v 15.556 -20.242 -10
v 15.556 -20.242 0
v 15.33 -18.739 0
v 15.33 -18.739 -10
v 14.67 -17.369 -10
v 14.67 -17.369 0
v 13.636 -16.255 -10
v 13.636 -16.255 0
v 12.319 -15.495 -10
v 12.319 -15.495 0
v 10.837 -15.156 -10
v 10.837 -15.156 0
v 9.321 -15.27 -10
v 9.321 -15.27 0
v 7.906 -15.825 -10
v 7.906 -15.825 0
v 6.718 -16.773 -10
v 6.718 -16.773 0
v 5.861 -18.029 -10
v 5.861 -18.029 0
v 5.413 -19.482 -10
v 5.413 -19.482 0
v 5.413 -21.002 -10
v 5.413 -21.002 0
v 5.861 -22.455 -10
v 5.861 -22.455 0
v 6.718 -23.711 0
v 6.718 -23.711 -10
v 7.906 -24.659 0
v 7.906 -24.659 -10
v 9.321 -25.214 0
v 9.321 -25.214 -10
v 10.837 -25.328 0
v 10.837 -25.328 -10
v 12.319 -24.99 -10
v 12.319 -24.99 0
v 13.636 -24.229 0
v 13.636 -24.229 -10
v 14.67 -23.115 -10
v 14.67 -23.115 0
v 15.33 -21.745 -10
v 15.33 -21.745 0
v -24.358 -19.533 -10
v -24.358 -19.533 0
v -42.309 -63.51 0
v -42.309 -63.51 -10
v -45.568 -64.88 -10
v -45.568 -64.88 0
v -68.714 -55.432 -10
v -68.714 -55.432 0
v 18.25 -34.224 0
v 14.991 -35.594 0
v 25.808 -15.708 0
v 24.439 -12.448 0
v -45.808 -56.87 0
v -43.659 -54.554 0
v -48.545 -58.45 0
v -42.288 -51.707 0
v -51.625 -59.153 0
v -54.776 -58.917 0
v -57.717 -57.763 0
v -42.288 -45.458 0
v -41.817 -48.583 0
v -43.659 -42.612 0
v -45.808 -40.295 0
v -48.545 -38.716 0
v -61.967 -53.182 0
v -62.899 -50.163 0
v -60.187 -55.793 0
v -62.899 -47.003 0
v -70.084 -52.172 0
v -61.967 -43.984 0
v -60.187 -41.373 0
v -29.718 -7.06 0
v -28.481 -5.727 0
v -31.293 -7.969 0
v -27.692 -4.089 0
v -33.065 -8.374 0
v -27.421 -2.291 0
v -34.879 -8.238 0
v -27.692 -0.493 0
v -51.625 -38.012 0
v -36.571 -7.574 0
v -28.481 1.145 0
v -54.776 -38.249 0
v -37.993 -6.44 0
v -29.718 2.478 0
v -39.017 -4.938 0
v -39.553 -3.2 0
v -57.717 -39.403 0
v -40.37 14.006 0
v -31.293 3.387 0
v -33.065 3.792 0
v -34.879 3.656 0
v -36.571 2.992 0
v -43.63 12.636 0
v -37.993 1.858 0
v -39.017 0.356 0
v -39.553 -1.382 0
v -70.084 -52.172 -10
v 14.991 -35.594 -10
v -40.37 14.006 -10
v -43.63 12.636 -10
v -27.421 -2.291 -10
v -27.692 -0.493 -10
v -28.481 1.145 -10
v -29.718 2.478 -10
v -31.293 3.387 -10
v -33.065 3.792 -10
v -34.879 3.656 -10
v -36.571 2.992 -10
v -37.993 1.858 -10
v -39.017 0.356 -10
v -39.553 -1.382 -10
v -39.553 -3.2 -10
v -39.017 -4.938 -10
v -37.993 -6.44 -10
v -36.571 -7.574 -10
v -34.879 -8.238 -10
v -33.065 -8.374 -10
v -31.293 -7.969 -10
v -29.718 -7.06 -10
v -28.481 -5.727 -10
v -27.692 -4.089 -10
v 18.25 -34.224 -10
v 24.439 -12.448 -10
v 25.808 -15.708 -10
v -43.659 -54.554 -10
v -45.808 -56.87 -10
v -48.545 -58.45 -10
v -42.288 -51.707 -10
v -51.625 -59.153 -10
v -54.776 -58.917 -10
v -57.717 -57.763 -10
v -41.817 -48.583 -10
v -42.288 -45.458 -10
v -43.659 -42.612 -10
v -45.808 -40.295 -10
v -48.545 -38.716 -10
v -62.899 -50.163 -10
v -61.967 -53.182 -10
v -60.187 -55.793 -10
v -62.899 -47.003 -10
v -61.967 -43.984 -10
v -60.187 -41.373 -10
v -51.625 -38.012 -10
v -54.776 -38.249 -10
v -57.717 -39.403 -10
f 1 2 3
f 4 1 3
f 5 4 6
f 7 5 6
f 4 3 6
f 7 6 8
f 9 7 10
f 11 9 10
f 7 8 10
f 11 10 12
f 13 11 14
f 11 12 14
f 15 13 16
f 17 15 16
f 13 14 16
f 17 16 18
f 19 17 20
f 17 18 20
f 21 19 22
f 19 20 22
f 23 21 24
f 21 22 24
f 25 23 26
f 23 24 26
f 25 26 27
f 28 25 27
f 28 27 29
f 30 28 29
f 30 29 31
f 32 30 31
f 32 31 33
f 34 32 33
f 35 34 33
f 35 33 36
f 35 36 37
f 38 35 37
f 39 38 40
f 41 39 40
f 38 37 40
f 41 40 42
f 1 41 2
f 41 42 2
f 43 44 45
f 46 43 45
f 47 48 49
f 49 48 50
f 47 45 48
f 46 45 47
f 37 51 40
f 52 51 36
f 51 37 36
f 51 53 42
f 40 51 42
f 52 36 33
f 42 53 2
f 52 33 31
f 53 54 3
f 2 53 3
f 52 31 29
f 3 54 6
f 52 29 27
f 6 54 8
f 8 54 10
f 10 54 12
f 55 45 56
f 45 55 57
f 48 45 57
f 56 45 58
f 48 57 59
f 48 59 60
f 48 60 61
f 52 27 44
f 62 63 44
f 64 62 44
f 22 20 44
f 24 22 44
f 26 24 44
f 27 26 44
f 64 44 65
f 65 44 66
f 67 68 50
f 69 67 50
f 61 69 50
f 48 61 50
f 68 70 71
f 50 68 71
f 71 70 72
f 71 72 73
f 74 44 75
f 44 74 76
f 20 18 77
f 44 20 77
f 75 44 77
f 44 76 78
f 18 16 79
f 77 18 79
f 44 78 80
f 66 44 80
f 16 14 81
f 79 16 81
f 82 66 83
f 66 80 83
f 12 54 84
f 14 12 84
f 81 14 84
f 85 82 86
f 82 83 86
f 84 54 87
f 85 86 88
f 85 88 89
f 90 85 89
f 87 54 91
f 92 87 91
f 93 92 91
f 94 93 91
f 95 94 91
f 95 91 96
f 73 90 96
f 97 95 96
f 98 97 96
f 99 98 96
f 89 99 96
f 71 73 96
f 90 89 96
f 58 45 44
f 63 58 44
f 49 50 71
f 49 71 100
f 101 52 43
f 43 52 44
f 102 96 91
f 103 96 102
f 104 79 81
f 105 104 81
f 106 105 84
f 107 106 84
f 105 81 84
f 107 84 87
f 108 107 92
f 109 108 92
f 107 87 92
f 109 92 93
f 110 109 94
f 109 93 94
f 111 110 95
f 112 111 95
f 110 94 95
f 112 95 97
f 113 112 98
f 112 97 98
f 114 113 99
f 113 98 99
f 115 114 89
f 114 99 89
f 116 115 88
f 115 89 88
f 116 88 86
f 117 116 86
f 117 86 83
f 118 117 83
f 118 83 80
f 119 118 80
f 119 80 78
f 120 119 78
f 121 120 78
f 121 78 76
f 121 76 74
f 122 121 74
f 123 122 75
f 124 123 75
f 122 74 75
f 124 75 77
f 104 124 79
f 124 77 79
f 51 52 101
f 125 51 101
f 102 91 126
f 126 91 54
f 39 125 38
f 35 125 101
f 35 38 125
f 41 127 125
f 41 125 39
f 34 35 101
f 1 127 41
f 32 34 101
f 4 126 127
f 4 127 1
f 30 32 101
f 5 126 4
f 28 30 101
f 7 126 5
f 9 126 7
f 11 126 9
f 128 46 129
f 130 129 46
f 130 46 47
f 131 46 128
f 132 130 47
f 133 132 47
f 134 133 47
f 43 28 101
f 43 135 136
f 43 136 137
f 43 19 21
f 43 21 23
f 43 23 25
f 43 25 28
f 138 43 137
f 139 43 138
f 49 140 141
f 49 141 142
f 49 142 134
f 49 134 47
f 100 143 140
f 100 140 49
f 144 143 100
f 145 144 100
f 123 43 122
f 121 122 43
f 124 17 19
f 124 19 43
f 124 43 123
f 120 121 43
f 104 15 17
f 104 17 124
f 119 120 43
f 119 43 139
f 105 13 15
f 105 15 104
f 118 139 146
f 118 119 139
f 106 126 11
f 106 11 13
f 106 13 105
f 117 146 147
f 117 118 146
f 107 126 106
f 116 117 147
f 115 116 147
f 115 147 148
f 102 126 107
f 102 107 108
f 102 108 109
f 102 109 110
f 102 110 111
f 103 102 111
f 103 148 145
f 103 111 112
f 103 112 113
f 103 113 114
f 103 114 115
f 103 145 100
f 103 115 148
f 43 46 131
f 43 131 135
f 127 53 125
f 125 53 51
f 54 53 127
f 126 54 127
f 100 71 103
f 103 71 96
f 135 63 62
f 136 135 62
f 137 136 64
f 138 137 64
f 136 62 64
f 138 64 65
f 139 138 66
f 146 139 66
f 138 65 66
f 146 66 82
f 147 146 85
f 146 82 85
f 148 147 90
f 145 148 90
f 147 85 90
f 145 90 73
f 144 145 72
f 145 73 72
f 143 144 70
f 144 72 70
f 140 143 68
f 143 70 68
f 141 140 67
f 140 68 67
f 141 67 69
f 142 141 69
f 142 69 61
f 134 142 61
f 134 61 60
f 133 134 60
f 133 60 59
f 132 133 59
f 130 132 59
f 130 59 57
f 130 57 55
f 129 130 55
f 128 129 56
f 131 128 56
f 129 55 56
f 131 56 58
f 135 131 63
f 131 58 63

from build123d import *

# Parameters (mm, degrees)
SKETCH_1_R      = 5.1
SKETCH_1_R_2    = 6.1
SKETCH_1_R_3    = 10.6
EXTRUDE_1_DEPTH = 10
CHAMFER_1_SIZE  = 2.5


with BuildPart() as part:
    # 草圖1 → 填料-伸長1 (new body)
    with BuildSketch(Plane.XY):
        Polygon((-42.684704159, 14.950876454), (26.753169389, -13.39311263), (17.305173028, -36.539070479), (-24.357551101, -19.532677029), (-43.253543823, -65.824592728), (-71.028693242, -54.486997094), align=None)
        with Locations((10.456192284, -20.242093374)):
            Circle(SKETCH_1_R, mode=Mode.SUBTRACT)
        with Locations((-33.52112763, -2.290900288)):
            Circle(SKETCH_1_R_2, mode=Mode.SUBTRACT)
        with Locations((-52.417120352, -48.582815986)):
            Circle(SKETCH_1_R_3, mode=Mode.SUBTRACT)
    extrude(amount=-EXTRUDE_1_DEPTH)

    # 導角1
    chamfer_1_edges = [part.edges().sort_by_distance(p)[0] for p in [
        (-42.684704159, 14.950876454, -5),
        (26.753169389, -13.39311263, -5),
        (17.305173028, -36.539070479, -5),
        (-43.253543823, -65.824592728, -5),
        (-71.028693242, -54.486997094, -5),
    ]]
    chamfer(chamfer_1_edges, length=CHAMFER_1_SIZE)


solid = part.part
